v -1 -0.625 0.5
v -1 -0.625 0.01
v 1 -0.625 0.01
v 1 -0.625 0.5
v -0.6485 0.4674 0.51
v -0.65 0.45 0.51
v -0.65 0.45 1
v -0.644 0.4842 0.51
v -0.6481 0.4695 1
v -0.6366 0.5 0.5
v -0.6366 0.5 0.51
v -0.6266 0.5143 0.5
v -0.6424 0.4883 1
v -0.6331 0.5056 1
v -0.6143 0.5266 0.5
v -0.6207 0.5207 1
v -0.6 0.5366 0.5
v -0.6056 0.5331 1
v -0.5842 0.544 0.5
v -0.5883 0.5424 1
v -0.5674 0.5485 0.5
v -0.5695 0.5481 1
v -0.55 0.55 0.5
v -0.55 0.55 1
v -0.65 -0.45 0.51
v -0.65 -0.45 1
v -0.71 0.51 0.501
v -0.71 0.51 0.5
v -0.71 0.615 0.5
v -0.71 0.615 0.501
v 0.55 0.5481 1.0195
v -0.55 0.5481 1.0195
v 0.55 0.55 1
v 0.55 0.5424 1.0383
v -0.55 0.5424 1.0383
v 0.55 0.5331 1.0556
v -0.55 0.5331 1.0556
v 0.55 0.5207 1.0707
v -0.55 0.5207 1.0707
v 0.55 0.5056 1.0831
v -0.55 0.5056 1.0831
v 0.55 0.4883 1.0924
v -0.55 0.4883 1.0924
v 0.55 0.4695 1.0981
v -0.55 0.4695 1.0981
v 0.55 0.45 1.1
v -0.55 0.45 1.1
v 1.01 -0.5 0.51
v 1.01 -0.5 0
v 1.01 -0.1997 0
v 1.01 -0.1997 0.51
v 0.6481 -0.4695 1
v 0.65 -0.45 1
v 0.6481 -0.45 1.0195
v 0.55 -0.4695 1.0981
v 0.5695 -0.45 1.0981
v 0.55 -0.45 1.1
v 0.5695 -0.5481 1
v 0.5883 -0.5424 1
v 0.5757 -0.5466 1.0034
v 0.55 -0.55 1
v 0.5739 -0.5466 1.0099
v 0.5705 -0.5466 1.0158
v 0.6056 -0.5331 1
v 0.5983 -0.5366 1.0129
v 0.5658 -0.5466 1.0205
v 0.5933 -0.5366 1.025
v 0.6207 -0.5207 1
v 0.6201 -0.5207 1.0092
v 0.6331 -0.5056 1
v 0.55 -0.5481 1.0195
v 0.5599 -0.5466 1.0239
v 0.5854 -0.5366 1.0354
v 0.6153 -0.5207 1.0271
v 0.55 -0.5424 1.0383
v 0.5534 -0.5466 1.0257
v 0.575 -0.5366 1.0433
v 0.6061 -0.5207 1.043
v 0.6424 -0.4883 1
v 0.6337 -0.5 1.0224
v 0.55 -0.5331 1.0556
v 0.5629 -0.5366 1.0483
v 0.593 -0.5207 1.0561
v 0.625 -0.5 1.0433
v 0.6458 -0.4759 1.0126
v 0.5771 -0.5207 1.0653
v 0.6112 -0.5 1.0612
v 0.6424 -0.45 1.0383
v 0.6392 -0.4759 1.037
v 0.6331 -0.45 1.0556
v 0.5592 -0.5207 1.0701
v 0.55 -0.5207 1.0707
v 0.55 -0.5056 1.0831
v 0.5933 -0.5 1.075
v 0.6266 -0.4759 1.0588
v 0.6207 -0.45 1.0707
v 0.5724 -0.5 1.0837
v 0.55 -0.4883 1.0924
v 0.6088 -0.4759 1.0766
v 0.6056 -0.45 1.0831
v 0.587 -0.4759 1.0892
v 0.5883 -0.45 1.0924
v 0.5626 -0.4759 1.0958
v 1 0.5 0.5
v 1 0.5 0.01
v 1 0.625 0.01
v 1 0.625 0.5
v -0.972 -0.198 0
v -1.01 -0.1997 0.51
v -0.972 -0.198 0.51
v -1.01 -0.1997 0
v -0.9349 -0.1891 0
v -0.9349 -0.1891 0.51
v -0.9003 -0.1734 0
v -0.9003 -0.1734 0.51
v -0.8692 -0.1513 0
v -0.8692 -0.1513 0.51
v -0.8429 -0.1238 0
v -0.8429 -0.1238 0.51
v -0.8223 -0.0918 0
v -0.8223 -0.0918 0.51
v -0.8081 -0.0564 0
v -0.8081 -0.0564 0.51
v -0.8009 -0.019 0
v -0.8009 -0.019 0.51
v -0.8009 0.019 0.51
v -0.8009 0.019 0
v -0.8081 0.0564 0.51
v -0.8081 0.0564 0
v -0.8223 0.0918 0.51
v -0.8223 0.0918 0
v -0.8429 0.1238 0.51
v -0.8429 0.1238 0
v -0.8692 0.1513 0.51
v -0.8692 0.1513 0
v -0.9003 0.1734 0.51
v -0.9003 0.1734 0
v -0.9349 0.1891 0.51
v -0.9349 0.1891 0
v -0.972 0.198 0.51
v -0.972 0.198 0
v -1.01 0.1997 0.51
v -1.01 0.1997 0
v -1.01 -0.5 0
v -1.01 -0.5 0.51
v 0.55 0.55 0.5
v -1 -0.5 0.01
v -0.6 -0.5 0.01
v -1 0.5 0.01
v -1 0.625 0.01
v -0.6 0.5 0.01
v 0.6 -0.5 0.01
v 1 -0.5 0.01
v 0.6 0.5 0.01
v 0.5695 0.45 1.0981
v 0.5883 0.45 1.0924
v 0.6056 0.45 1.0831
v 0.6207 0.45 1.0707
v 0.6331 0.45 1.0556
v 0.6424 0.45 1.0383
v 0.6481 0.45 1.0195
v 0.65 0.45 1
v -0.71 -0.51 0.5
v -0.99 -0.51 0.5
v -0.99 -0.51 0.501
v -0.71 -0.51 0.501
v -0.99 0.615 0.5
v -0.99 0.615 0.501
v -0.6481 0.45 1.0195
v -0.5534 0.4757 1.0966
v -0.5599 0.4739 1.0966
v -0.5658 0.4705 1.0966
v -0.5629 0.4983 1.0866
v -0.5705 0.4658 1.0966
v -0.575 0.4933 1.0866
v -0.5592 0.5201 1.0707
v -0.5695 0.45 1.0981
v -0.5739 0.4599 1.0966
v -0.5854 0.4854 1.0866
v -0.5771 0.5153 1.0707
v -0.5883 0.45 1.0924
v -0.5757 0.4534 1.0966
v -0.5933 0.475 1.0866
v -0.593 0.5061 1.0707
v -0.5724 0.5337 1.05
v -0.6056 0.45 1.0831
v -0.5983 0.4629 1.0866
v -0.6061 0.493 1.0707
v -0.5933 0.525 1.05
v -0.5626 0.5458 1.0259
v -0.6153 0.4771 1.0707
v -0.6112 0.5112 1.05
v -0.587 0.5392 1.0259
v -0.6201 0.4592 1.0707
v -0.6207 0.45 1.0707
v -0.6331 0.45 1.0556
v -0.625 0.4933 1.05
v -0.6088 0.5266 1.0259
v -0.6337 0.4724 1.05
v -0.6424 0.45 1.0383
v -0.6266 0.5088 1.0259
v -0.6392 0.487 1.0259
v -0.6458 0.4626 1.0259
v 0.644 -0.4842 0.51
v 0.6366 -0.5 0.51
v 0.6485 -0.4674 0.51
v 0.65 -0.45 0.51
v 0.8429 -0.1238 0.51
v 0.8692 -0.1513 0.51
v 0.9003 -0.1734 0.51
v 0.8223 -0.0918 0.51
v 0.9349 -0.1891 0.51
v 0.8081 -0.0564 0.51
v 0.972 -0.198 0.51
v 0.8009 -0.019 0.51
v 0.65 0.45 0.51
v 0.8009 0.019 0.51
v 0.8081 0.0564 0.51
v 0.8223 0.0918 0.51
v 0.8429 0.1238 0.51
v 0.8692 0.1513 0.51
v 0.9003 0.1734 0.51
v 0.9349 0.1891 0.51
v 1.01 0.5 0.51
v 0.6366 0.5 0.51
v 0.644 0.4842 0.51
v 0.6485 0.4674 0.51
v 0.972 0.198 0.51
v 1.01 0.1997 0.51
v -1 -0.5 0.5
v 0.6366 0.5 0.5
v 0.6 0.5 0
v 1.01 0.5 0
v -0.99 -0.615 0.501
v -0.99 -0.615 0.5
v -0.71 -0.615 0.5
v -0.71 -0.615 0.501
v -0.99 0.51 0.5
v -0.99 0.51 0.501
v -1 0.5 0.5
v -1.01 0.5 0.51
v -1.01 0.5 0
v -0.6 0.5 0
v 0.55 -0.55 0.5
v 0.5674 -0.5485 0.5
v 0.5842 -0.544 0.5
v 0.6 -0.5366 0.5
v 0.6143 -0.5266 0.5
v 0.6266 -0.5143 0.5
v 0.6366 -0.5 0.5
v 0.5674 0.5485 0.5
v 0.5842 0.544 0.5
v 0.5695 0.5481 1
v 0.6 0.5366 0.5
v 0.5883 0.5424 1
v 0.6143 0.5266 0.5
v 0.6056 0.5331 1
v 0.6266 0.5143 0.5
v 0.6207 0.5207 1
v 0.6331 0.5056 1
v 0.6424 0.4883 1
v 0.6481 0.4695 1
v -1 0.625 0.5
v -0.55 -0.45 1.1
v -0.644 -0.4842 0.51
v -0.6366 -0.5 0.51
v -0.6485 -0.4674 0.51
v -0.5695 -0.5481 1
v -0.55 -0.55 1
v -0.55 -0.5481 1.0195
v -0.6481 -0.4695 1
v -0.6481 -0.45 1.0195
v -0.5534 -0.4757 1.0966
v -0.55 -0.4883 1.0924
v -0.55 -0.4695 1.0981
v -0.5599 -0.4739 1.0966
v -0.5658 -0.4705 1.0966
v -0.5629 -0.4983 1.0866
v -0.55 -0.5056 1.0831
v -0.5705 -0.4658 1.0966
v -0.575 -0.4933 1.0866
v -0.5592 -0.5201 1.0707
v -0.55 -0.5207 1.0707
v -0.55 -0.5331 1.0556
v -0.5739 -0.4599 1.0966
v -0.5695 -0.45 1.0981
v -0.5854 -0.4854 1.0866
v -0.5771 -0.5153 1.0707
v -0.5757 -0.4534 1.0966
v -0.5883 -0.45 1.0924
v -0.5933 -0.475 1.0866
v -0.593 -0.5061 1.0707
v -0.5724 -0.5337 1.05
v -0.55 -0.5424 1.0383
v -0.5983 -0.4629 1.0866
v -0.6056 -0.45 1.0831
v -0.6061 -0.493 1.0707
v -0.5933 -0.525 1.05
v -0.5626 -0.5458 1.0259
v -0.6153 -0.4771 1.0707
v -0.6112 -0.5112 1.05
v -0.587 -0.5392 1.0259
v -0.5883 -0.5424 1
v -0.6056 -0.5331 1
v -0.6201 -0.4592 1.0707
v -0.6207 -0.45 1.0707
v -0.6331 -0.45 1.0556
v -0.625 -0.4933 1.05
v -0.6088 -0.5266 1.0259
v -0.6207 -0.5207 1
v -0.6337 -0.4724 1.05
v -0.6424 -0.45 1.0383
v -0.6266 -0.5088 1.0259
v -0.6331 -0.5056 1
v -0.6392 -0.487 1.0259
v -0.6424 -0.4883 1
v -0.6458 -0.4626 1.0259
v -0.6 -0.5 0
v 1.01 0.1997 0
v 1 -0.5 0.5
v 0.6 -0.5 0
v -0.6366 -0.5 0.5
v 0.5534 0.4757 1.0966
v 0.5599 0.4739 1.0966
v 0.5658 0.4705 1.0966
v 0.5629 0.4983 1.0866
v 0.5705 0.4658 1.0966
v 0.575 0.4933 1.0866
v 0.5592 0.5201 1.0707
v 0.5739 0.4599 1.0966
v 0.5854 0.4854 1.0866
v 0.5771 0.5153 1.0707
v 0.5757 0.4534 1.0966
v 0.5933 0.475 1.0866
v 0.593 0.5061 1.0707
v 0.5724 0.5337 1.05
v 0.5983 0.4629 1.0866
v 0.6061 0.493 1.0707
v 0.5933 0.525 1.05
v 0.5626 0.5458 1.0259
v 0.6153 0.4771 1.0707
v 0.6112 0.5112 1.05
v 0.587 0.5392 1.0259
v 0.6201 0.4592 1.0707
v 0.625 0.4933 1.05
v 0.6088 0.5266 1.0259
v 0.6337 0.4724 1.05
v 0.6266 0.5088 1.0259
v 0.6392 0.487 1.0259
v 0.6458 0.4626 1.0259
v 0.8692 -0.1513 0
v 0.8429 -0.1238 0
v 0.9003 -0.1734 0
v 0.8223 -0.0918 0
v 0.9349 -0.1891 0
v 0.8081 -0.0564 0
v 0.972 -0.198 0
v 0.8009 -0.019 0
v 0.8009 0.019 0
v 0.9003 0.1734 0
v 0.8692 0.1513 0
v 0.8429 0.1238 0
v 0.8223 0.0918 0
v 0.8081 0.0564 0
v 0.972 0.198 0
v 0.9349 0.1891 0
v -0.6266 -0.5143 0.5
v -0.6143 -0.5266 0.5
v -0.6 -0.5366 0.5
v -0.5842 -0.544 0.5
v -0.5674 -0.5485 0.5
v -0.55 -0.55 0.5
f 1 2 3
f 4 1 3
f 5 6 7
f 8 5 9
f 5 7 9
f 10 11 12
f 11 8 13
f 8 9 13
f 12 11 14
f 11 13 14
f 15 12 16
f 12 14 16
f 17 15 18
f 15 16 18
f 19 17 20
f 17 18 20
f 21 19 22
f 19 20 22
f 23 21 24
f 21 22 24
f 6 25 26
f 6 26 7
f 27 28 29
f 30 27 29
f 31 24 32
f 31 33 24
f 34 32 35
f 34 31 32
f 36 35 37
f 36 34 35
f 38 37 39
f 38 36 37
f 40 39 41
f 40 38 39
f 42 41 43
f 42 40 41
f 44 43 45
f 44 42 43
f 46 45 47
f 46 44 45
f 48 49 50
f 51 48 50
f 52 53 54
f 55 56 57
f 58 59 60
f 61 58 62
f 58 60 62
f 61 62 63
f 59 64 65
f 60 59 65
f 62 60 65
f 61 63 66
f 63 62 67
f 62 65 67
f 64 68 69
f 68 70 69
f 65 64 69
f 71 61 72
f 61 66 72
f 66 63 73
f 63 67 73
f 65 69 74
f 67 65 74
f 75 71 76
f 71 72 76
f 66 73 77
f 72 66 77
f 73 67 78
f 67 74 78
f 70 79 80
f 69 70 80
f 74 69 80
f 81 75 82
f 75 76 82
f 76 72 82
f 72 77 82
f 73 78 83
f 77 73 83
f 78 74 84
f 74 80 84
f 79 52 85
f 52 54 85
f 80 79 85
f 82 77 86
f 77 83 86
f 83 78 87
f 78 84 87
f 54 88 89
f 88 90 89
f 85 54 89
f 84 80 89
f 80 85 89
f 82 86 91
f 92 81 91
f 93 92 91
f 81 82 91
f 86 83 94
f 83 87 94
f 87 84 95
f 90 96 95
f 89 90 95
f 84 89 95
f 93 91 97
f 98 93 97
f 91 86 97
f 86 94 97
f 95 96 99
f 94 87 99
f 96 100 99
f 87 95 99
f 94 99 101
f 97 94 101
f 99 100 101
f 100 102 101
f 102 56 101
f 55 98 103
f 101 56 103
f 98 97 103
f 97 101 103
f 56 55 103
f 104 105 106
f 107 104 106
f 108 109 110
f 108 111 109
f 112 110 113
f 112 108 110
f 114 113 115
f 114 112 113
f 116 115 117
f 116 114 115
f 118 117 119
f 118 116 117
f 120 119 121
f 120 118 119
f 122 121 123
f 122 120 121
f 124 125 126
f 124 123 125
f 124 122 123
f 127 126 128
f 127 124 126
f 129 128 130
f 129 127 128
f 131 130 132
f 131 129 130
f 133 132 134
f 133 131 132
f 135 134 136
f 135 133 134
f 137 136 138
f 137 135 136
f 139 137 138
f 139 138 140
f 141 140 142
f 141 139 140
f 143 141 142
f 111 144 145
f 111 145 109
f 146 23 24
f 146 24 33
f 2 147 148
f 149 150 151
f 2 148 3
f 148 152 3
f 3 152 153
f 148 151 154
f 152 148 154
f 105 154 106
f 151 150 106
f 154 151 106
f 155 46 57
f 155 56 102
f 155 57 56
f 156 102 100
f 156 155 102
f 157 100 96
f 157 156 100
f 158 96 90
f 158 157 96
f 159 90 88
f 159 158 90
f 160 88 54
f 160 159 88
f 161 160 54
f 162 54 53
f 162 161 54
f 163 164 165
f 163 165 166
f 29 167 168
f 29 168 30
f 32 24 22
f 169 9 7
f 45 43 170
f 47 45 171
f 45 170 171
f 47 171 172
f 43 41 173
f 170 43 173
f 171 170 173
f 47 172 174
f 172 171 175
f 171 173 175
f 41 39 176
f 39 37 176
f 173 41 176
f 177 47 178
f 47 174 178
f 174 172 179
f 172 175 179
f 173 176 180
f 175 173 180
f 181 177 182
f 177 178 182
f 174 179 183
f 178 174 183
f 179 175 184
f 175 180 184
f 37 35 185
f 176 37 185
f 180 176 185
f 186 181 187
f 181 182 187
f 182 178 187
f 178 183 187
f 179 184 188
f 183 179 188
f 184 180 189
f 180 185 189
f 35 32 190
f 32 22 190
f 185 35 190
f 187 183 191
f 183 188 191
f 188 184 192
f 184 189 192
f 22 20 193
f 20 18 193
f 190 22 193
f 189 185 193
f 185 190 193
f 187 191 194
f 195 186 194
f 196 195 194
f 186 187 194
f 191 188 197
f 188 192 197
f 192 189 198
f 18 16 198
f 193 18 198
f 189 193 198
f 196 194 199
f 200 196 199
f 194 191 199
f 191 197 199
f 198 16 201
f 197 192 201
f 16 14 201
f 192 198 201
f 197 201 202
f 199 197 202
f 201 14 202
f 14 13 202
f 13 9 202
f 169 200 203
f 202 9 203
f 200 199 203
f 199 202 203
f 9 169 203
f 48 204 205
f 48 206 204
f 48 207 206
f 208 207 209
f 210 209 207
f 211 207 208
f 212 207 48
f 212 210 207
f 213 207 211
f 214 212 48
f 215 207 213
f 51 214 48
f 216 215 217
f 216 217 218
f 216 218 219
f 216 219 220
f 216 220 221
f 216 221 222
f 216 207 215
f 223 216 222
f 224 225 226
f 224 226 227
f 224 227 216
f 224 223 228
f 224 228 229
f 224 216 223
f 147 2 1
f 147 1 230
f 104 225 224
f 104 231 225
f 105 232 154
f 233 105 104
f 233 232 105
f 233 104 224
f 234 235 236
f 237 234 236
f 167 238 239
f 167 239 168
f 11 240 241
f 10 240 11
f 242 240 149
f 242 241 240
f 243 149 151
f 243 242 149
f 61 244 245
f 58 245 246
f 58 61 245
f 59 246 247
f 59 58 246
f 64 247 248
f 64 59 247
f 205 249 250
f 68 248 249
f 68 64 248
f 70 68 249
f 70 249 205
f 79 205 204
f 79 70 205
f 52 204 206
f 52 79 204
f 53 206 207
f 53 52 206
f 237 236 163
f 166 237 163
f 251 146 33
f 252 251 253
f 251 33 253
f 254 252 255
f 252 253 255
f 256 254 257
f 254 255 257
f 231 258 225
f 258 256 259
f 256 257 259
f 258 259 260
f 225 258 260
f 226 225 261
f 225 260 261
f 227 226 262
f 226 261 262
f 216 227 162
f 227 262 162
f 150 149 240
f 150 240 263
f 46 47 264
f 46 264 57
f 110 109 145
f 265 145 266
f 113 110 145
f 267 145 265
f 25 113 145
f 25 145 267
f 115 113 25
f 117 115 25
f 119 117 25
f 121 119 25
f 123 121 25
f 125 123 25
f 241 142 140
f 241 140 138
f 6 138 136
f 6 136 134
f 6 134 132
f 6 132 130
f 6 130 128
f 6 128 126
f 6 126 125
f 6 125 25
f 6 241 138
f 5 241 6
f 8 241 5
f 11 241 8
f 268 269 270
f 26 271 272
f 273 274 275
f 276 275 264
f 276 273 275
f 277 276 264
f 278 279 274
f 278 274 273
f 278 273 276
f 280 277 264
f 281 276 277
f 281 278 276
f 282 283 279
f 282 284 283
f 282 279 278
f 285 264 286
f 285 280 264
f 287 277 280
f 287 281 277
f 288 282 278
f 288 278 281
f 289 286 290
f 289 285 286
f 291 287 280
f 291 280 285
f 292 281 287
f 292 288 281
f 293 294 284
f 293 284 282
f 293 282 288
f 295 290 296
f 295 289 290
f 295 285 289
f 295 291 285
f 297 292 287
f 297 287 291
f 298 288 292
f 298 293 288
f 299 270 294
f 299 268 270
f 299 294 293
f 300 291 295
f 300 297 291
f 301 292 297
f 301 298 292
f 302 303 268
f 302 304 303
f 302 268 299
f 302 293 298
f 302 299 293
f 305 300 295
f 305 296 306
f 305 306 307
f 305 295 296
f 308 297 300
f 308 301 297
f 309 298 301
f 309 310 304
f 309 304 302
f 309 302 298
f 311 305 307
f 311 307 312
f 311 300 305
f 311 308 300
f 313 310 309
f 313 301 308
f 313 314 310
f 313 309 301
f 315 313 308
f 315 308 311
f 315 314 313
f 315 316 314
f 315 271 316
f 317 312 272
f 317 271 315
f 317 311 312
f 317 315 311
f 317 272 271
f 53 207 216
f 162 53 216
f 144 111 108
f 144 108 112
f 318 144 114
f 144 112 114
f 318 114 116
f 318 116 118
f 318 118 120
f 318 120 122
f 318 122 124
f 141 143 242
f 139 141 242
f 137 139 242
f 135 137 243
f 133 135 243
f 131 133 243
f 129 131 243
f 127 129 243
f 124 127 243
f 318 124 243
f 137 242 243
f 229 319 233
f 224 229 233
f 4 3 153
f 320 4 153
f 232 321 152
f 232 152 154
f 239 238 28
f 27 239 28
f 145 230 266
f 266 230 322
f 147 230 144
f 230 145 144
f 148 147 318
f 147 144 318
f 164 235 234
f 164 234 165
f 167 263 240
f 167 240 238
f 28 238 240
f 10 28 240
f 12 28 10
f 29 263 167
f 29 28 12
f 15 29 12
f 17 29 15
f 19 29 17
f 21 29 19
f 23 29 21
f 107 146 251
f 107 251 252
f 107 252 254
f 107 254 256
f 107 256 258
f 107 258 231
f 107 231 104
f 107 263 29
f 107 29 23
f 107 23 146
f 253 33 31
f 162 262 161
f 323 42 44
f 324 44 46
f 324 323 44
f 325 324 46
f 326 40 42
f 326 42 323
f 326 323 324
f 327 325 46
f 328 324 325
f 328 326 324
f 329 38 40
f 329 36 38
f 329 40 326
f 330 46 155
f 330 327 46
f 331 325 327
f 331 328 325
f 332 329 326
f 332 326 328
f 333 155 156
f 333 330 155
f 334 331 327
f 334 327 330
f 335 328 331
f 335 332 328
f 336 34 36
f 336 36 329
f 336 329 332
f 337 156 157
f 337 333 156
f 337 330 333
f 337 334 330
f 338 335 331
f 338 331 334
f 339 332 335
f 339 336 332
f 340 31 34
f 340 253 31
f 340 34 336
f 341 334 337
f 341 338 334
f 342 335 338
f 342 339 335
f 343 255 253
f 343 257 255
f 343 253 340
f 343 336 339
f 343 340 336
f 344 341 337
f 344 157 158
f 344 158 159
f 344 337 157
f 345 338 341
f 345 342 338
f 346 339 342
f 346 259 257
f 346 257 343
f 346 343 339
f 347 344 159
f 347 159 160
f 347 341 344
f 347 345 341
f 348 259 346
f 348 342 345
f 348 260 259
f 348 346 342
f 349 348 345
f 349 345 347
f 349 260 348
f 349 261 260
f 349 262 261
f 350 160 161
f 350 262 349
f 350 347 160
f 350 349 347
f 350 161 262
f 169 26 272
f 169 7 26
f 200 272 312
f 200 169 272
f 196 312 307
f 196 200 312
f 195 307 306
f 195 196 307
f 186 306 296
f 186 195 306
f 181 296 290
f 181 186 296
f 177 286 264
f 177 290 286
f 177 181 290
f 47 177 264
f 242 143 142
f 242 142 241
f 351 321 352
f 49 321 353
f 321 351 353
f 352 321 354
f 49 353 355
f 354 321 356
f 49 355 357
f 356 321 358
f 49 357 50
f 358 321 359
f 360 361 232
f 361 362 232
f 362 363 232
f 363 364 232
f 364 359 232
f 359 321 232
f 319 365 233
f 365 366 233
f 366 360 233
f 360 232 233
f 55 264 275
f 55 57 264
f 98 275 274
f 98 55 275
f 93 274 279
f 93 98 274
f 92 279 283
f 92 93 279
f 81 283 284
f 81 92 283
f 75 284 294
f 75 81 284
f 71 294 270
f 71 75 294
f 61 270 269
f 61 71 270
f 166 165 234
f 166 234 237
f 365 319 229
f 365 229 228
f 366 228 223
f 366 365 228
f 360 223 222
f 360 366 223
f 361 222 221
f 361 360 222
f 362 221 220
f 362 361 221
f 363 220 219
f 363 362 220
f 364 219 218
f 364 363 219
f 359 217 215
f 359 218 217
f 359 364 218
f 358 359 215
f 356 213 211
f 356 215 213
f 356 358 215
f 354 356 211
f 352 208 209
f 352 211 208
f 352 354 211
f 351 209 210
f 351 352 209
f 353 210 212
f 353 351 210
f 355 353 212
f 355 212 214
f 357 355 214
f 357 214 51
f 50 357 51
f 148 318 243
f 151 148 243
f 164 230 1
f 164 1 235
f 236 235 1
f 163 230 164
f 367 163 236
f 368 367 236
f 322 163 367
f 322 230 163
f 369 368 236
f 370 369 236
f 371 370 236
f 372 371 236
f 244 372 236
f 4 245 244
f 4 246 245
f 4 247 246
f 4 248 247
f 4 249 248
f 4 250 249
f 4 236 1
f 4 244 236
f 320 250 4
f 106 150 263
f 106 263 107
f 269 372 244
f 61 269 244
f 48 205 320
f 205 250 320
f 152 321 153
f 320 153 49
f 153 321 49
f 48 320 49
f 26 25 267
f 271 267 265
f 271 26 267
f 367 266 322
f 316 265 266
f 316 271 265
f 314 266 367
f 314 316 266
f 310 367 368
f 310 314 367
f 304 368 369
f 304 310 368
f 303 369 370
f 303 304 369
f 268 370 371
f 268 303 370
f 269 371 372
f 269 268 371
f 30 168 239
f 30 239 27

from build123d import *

# Parameters (mm, degrees)
EXTRUDE_START       = 0.01
SKETCH_2_W          = 2
SKETCH_2_H          = 1.25
EXTRUDE_1_DEPTH     = 0.49
SKETCH_3_W          = 0.41
SKETCH_3_H          = 1
EXTRUDE_2_DEPTH     = 0.51
EXTRUDE_START_2     = 0.5
SKETCH_4_W          = 1.3
SKETCH_4_H          = 1.1
EXTRUDE_3_DEPTH     = 0.6
FILLET_1_R          = 0.1
SKETCH_5_W          = 0.28
SKETCH_5_H          = 0.105
EXTRUDE_4_DEPTH     = 0.001
SKETCH_6_R          = 0.2
CUT_EXTRUDE_2_DEPTH = 0.52


with BuildPart() as part:
    # Эскиз2 → Бобышка-Вытянуть1 (new body)
    with BuildSketch(Plane.XY.offset(EXTRUDE_START)):
        Rectangle(SKETCH_2_W, SKETCH_2_H)
    extrude(amount=EXTRUDE_1_DEPTH)

    # Эскиз3 → Бобышка-Вытянуть2 (add)
    with BuildSketch(Plane.XY):
        with Locations((-0.805, 0)):
            Rectangle(SKETCH_3_W, SKETCH_3_H)
        with Locations((0.805, 0)):
            Rectangle(SKETCH_3_W, SKETCH_3_H)
    extrude(amount=EXTRUDE_2_DEPTH)

    # Эскиз4 → Бобышка-Вытянуть3 (add)
    with BuildSketch(Plane.XY.offset(EXTRUDE_START_2)):
        Rectangle(SKETCH_4_W, SKETCH_4_H)
    extrude(amount=EXTRUDE_3_DEPTH)

    # Скругление1
    fillet_1_edges = [part.edges().sort_by_distance(p)[0] for p in [
        (0.65, 0.55, 0.8),
        (-0.65, 0.55, 0.8),
        (0, 0.55, 1.1),
        (0.65, 0, 1.1),
        (0.65, -0.55, 0.8),
        (-0.65, -0.55, 0.8),
        (0, -0.55, 1.1),
        (-0.65, 0, 1.1),
    ]]
    fillet(fillet_1_edges, radius=FILLET_1_R)

    # Эскиз5 → Бобышка-Вытянуть4 (add)
    with BuildSketch(Plane.XY.offset(0.5)):
        with Locations((-0.85, 0.5625)):
            Rectangle(SKETCH_5_W, SKETCH_5_H)
        with Locations((-0.85, -0.5625)):
            Rectangle(SKETCH_5_W, SKETCH_5_H)
    extrude(amount=EXTRUDE_4_DEPTH)

    # Эскиз6 → Вырез-Вытянуть2 (cut)
    with BuildSketch(Plane.XY):
        with Locations((-1, 0)):
            Circle(SKETCH_6_R)
        with Locations((1, 0)):
            Circle(SKETCH_6_R)
    extrude(amount=CUT_EXTRUDE_2_DEPTH, mode=Mode.SUBTRACT)


solid = part.part
